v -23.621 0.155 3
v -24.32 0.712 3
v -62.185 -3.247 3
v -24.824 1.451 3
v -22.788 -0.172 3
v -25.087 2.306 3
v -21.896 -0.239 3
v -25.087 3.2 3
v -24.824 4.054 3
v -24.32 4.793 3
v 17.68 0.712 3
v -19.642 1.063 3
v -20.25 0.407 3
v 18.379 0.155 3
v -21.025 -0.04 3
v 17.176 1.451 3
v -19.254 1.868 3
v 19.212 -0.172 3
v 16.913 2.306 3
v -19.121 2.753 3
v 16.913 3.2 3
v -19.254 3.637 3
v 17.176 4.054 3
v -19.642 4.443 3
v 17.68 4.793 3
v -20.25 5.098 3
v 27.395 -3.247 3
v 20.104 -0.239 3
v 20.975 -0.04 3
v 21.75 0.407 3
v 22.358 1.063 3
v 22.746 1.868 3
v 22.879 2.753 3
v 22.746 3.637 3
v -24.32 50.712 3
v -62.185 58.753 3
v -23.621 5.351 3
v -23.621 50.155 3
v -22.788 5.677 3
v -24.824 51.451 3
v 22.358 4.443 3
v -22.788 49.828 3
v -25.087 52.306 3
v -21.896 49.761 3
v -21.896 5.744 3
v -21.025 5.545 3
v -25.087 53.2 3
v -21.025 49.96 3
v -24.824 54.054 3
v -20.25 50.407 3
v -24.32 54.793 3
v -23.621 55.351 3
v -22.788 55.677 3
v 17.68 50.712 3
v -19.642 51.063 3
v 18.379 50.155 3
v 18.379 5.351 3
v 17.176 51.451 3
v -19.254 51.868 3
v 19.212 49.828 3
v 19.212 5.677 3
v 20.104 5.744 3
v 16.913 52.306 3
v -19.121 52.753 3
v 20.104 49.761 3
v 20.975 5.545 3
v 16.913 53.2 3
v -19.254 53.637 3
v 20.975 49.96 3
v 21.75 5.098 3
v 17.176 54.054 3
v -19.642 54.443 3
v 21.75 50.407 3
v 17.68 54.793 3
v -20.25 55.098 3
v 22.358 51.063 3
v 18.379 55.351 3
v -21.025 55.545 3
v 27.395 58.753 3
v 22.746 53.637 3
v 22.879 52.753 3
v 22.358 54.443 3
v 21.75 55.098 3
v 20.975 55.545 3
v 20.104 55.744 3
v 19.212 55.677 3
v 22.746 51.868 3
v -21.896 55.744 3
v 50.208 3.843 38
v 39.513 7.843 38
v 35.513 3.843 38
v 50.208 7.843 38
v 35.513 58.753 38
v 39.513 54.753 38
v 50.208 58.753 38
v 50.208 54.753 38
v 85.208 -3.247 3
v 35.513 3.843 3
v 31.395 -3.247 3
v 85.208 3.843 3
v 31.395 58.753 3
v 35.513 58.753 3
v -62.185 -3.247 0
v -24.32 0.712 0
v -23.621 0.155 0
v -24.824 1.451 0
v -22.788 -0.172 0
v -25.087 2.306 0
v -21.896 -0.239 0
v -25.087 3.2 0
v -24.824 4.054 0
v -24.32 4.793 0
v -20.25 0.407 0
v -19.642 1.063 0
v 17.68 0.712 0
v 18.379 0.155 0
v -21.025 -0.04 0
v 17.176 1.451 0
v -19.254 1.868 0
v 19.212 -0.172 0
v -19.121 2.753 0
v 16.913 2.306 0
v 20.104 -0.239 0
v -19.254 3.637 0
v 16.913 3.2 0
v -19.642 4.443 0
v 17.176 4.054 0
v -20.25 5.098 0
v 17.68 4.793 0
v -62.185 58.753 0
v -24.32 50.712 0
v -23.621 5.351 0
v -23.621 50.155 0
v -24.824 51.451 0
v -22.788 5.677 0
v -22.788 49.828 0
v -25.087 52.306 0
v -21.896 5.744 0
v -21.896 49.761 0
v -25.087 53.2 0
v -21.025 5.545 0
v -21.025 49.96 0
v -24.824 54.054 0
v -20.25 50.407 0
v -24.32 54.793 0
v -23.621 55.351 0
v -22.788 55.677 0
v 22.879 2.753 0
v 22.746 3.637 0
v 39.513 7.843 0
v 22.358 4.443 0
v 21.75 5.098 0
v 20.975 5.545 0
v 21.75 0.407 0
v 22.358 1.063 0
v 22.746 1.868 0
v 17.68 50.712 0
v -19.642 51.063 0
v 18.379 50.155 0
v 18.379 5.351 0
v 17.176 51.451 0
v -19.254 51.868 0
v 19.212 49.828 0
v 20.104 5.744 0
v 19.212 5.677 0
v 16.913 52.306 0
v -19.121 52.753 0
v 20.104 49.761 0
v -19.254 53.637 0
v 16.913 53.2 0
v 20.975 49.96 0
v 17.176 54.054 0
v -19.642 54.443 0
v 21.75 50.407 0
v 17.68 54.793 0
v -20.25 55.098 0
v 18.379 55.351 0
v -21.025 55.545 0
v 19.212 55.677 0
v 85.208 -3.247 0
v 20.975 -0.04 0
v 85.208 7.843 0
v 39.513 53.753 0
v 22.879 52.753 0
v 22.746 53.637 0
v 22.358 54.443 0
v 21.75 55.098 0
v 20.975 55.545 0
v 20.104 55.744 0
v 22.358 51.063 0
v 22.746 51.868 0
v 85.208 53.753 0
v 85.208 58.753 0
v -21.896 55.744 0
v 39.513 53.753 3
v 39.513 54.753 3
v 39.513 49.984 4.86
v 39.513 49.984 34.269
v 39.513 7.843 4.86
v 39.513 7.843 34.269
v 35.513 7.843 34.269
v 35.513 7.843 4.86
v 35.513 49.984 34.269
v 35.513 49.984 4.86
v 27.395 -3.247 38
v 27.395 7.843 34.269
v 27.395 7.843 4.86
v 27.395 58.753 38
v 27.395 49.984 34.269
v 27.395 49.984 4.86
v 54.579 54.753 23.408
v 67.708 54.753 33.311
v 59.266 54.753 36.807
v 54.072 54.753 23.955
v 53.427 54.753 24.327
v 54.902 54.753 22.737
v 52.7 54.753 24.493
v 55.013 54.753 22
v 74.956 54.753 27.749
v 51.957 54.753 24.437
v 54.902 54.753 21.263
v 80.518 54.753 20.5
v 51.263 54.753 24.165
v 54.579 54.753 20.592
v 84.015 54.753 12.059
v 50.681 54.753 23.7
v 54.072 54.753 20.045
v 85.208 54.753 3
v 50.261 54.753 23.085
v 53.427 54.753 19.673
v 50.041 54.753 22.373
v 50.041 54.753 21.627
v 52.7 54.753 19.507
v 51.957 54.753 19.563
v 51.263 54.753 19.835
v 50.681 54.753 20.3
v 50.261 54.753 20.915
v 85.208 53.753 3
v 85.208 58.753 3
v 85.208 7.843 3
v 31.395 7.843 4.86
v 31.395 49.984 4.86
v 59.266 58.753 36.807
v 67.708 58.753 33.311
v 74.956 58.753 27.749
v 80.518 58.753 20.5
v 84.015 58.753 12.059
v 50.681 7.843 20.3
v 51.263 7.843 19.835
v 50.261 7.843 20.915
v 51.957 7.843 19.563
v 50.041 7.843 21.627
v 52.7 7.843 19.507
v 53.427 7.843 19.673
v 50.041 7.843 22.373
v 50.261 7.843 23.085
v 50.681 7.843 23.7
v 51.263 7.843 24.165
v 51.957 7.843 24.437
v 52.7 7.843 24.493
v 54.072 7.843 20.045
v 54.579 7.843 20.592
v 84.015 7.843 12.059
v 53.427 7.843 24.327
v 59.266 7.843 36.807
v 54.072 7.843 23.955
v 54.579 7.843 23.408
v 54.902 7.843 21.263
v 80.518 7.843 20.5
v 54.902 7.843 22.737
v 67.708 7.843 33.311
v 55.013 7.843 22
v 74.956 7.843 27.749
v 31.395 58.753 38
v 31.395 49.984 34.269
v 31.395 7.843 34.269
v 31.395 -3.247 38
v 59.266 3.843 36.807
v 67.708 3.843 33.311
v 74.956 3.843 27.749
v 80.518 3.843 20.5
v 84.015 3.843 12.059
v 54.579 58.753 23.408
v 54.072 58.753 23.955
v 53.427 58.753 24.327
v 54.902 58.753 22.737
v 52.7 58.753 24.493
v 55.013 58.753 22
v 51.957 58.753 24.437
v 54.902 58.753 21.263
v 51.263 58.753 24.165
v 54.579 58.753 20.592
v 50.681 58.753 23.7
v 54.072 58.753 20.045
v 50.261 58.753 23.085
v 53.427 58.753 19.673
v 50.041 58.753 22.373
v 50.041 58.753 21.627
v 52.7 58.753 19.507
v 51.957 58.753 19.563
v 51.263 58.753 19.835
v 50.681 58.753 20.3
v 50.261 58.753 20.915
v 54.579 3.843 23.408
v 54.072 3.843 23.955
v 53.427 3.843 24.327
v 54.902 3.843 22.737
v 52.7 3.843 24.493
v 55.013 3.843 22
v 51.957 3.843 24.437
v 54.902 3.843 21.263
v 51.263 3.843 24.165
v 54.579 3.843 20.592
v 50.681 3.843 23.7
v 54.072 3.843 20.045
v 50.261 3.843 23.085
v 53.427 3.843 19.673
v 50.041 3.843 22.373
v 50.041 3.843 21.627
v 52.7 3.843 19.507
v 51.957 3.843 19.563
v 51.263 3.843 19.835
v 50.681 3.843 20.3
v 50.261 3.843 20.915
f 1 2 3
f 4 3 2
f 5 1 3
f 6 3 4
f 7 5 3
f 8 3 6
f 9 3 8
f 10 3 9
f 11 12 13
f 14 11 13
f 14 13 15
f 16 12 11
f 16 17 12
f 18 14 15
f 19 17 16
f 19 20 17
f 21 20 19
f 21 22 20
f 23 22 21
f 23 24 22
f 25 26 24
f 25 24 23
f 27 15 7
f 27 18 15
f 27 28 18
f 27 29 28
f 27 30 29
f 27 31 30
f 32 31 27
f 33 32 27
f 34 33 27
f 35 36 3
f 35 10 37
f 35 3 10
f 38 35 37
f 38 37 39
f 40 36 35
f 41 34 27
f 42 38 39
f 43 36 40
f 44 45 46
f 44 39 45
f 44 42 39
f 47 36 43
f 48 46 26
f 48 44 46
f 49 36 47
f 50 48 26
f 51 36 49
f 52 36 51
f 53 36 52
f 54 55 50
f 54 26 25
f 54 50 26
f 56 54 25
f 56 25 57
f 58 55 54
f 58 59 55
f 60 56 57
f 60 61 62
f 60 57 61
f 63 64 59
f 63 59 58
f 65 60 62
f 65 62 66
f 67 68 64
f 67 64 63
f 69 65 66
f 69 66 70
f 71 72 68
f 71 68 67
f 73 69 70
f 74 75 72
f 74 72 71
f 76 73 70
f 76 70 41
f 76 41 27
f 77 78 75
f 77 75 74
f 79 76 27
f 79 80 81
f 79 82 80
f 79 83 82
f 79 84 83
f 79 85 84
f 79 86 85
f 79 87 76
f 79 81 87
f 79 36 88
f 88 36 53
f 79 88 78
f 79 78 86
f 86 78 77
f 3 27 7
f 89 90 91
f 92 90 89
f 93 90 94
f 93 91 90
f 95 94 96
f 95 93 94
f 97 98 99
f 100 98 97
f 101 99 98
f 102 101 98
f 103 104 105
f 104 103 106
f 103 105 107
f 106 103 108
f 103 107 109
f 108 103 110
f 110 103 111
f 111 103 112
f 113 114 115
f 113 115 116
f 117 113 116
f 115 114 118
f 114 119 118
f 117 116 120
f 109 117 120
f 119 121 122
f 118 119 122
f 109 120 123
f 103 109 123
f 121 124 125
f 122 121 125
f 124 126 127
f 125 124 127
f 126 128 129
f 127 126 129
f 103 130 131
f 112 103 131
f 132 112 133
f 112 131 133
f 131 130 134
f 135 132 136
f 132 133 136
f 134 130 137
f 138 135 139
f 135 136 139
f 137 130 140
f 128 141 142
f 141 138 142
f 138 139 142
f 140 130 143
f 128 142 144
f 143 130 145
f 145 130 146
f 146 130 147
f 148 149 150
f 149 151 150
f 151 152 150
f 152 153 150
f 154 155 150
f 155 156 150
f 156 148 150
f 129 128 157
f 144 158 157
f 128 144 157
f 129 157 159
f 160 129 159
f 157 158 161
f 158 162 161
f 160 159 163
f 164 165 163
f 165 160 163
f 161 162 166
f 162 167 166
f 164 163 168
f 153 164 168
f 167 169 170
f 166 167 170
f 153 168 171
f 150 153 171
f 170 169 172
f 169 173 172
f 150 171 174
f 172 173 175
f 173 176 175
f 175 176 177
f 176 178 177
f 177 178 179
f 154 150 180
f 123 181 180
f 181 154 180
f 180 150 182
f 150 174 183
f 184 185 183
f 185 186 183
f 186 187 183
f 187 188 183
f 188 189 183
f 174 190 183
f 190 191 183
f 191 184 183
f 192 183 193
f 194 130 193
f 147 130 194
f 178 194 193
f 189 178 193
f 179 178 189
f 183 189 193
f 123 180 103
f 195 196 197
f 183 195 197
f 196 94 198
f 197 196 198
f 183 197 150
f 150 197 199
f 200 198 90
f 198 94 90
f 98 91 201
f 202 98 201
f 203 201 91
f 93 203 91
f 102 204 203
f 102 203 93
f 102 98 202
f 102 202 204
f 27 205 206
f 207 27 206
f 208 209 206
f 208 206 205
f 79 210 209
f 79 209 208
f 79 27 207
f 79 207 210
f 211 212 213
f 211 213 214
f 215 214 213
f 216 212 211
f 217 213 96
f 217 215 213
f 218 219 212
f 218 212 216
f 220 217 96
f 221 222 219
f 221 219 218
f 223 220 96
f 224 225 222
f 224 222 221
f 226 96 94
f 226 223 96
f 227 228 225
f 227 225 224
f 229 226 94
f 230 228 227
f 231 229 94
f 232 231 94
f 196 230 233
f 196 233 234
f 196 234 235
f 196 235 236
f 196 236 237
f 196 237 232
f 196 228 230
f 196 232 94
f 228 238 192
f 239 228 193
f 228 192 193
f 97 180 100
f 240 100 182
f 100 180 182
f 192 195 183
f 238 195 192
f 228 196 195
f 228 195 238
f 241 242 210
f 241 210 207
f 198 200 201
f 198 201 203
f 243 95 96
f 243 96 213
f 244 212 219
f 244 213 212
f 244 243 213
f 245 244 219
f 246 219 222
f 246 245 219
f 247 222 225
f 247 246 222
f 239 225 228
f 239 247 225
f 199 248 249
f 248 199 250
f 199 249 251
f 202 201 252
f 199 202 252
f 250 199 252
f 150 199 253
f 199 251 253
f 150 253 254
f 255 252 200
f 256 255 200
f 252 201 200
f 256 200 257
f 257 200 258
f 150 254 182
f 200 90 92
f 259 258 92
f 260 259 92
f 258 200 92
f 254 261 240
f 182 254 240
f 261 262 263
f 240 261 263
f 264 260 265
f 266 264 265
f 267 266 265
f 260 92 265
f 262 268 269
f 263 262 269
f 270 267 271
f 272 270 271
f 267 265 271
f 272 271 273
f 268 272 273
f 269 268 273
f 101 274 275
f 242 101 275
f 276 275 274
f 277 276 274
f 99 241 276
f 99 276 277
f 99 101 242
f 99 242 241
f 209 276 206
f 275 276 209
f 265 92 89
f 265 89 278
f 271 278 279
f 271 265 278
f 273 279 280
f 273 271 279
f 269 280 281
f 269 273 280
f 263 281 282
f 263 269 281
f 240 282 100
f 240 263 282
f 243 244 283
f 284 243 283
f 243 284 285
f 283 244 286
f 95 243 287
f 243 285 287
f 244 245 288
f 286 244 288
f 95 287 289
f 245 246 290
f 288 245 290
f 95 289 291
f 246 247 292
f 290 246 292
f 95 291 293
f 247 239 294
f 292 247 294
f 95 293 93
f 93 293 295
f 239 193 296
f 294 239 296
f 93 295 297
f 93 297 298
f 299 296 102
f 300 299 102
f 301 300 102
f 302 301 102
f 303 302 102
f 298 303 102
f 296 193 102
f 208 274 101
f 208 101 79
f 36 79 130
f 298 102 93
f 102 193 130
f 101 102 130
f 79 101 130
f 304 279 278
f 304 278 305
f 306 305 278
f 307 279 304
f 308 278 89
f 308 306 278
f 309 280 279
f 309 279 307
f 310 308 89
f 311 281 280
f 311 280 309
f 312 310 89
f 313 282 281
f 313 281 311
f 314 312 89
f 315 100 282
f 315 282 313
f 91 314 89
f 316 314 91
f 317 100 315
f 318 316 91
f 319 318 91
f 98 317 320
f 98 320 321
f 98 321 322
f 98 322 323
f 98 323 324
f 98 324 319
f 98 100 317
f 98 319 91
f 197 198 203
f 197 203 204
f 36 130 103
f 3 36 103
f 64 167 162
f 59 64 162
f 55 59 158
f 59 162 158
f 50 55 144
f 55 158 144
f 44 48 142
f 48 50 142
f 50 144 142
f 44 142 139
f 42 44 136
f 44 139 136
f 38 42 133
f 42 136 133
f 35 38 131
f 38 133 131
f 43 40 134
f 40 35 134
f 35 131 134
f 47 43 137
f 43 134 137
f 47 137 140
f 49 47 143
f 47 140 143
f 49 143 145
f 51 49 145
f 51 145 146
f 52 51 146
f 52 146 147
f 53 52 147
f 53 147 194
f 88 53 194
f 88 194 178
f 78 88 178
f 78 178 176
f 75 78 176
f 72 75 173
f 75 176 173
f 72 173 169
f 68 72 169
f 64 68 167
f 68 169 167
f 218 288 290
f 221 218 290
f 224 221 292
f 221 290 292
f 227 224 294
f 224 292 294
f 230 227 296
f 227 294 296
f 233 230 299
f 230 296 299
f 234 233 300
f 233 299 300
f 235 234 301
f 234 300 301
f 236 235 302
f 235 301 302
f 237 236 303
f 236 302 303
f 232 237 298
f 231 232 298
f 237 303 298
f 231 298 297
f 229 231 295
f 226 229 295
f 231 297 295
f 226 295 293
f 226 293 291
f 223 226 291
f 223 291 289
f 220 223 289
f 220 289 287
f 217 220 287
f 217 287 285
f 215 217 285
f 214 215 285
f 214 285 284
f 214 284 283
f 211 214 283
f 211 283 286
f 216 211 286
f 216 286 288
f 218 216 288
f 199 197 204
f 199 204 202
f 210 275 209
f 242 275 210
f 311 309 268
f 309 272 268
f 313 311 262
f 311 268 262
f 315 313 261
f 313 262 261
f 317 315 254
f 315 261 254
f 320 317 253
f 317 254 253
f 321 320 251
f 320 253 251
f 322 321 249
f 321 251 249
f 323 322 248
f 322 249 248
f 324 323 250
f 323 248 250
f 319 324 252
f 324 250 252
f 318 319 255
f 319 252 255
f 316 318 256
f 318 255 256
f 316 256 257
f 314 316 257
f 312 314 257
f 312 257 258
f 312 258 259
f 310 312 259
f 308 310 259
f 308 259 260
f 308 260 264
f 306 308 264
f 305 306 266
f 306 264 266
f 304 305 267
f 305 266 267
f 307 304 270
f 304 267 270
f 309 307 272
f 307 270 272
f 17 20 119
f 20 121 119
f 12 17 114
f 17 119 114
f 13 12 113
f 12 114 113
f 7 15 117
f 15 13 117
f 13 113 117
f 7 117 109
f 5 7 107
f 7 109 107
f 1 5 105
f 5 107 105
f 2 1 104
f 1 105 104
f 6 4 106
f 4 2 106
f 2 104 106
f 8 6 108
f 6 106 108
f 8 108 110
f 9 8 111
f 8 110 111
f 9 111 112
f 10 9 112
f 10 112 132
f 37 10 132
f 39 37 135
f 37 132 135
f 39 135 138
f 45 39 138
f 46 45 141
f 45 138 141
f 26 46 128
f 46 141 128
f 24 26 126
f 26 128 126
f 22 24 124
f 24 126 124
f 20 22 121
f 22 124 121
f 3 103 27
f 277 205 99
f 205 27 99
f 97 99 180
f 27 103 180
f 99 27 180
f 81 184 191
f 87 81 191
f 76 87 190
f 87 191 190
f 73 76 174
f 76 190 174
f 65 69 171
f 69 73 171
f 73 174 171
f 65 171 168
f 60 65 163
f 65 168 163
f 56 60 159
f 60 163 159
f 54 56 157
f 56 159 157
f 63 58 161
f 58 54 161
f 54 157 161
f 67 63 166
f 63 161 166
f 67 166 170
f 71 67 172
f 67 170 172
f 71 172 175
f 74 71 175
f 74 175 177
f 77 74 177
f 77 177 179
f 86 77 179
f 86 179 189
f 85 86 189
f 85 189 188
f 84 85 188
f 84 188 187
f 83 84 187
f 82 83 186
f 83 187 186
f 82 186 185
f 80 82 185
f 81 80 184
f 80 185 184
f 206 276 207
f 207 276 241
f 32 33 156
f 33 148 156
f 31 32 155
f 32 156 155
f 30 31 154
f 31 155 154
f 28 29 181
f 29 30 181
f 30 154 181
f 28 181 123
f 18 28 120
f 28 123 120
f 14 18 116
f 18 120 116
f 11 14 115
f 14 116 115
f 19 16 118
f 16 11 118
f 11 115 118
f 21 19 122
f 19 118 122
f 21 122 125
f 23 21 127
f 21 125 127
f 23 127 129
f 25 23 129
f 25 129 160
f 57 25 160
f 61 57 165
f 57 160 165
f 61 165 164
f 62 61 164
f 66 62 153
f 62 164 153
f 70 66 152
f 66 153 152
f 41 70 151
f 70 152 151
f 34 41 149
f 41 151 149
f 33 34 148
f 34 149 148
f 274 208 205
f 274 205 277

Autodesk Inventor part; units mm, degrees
ref_plane "YZ Plane" through (0, 0, 0) normal (1, 0, 0) x (0, 1, 0)
ref_plane "XZ Plane" through (0, 0, 0) normal (0, 1, 0) x (-1, 0, 0)
ref_plane "XY Plane" through (0, 0, 0) normal (0, 0, 1) x (1, 0, 0)
sketch "Skizze1" plane through (0, 0, 0) normal (0, 0, 1) x (1, 0, 0)
  arc A0 (-10.0563, 3.3011) -> (-12.2178, -3.2473) centre (-1.2178, -3.2473) ccw projected
  line L0 (-12.2178, -3.2473) -> (9.7822, -3.2473) projected
  arc A1 (9.7822, -3.2473) -> (7.6207, 3.3011) centre (-1.2178, -3.2473) ccw projected
  arc A2 (-3.7041, 1.8719) -> (7.6207, 3.3011) centre (-1.2178, 27.7527) ccw projected
  line L1 (-3.7041, 1.8719) -> (-4.2446, 1.7527) projected
  line L2 (-4.2446, 1.7527) -> (-4.7816, 1.7527) projected
  line L3 (-4.7816, 1.7527) -> (-6.4898, 2.2928) projected
  arc A3 (-10.0563, 3.3011) -> (-6.4898, 2.2928) centre (-1.2178, 27.7527) ccw projected
  arc A4 (-12.2178, 58.7527) -> (-10.0563, 52.2043) centre (-1.2178, 58.7527) ccw projected
  arc A5 (7.6207, 52.2043) -> (-10.0563, 52.2043) centre (-1.2178, 27.7527) ccw projected
  arc A6 (7.6207, 52.2043) -> (9.7822, 58.7527) centre (-1.2178, 58.7527) ccw projected
  line L4 (9.7822, 58.7527) -> (-12.2178, 58.7527) projected
  line L5 (85.2075, 58.7527) -> (80.2075, 58.7527) projected
  line L6 (80.2075, 58.7527) -> (80.2075, 53.7527) projected
  line L7 (80.2075, 53.7527) -> (85.2075, 53.7527) projected
  line L8 (85.2075, 53.7527) -> (85.2075, 58.7527) projected
  line L9 (85.2075, -3.2473) -> (85.2075, 1.7527) projected
  line L10 (85.2075, 1.7527) -> (80.2075, 1.7527) projected
  line L11 (80.2075, 1.7527) -> (80.2075, -3.2473) projected
  line L12 (80.2075, -3.2473) -> (85.2075, -3.2473) projected
  circle A7 centre (19.8794, 52.7527) radius 3 projected
  circle A8 centre (19.8794, 2.7527) radius 3 projected
  circle A9 centre (-22.1206, 2.7527) radius 3 projected
  circle A10 centre (-22.1206, 52.7527) radius 3 projected
  line L13 (85.2075, 58.7527) -> (-62.1847, 58.7527)
  line L14 (-62.1847, 58.7527) -> (-62.1847, -3.2473)
  line L15 (-62.1847, -3.2473) -> (85.2075, -3.2473)
  line L16 (85.2075, -3.2473) -> (85.2075, 58.7527)
  point P0 (0, 0)
extrude "Extrusion1" add sketch "Skizze1" along normal blind 3
sketch "Skizze2" plane through (0, 0, 3) normal (0, 0, 1) x (1, 0, 0)
  circle A0 centre (-3.1206, 27.7527) radius 15 projected
  line L0 (85.2075, 58.7527) -> (-62.1847, 58.7527) projected
  line L1 (-62.1847, -3.2473) -> (85.2075, -3.2473) projected
  line L2 (27.3951, 58.7527) -> (31.3951, 58.7527)
  line L3 (31.3951, 58.7527) -> (31.3951, -3.2473)
  line L4 (31.3951, -3.2473) -> (27.3951, -3.2473)
  line L5 (27.3951, -3.2473) -> (27.3951, 58.7527)
  line L6 (35.5129, 58.7527) -> (39.5129, 58.7527)
  line L7 (39.5129, 58.7527) -> (39.5129, 3.8427)
  line L8 (39.5129, 3.8427) -> (35.5129, 3.8427)
  line L9 (35.5129, 3.8427) -> (35.5129, 58.7527)
  line L10 (85.2075, -3.2473) -> (85.2075, 58.7527) projected
  line L11 (39.5129, 3.8427) -> (85.2075, 3.8427)
  line L12 (85.2075, 3.8427) -> (85.2075, 7.8427)
  line L13 (85.2075, 7.8427) -> (39.5129, 7.8427)
  line L14 (39.5129, 7.8427) -> (39.5129, 3.8427)
  line L15 (39.5129, 58.7527) -> (85.2075, 58.7527)
  line L16 (85.2075, 58.7527) -> (85.2075, 54.7527)
  line L17 (85.2075, 54.7527) -> (39.5129, 54.7527)
  line L18 (39.5129, 54.7527) -> (39.5129, 58.7527)
  point P0 (0, 0)
  dimension "d2" = 4
  dimension "d3" = 4
  dimension "d4" = 45.6946
  dimension "d5" = 4
  dimension "d12" = 45.6946
  dimension "d13" = 4
extrude "Extrusion2" add sketch "Skizze2" along normal blind 35 contours L10 L17 L7 L0 | L7 L8 L9 L0 | L10 L11 L7 L13 | L3 L1 L5 L0
sketch "Skizze3" plane through (0, 0, 3) normal (0, 0, 1) x (1, 0, 0)
  line L0 (39.5129, 54.7527) -> (39.5129, 7.8427) projected
  line L1 (39.5129, 7.8427) -> (85.2075, 7.8427) projected
  line L2 (85.2075, 7.8427) -> (85.2075, 54.7527) projected
  line L3 (35.5129, 58.7527) -> (31.3951, 58.7527) projected
  line L4 (27.7822, 53.7527) -> (85.2075, 53.7527) projected
  line L5 (39.5129, 7.8427) -> (85.2075, 7.8427)
  line L6 (85.2075, 7.8427) -> (85.2075, 53.7527)
  line L7 (85.2075, 53.7527) -> (39.5129, 53.7527)
  line L8 (39.5129, 53.7527) -> (39.5129, 7.8427)
  line L9 (35.5129, 3.8427) -> (35.5129, 58.7527) projected
  line L10 (31.3951, 58.7527) -> (31.3951, -3.2473) projected
  line L11 (31.3951, -3.2473) -> (85.2075, -3.2473) projected
  line L12 (85.2075, -3.2473) -> (85.2075, 3.8427) projected
  line L13 (85.2075, 3.8427) -> (35.5129, 3.8427) projected
  line L14 (85.2075, 54.7527) -> (39.5129, 54.7527) projected
  line L15 (27.3951, -3.2473) -> (27.3951, 58.7527) projected
  line L16 (27.3951, 58.7527) -> (-62.1847, 58.7527) projected
  line L17 (-62.1847, 58.7527) -> (-62.1847, -3.2473) projected
  line L18 (-62.1847, -3.2473) -> (27.3951, -3.2473) projected
  point P0 (0, 0)
extrude "Extrusion3" cut sketch "Skizze3" against normal blind 35 contours L4 L2 L1 L0
sketch "Skizze4" plane through (39.5129, 7.8427, 38) normal (1, 0, 0) x (0, 0, -1)
  line L0 (0, 0) -> (38, 0) projected
  line L1 (38, 45.91) -> (38, 0) projected
  line L2 (35, 45.91) -> (38, 45.91) projected
  line L3 (35, 46.91) -> (35, 45.91) projected
  line L4 (0, 0) -> (0, 46.91) projected
  line L5 (0, 0) -> (38, 0) projected
  line L6 (33.1404, 0) -> (3.7306, 0)
  line L7 (3.7306, 0) -> (3.7306, 42.1415)
  line L8 (3.7306, 42.1415) -> (33.1404, 42.1415)
  line L9 (33.1404, 42.1415) -> (33.1404, 0)
  line L10 (35, 46.91) -> (0, 46.91) projected
  point P0 (38, -7.8427)
extrude "Extrusion4" cut sketch "Skizze4" against normal blind 35 contours L7 L8 L9 L0
fillet "Rundung1" radius 35 2 edges at (85.2075, 5.8427, 38) (85.2075, 56.7527, 38)
sketch "Skizze5" plane through (-62.1847, 58.7527, 0) normal (0, 1, 0) x (1, 0, 0)
  arc A0 (112.3922, -38) -> (147.3922, -3) centre (112.3922, -3) ccw projected
  line L0 (147.3922, 0) -> (147.3922, -3) projected
  line L1 (147.3922, 0) -> (0, 0) projected
  line L2 (0, 0) -> (0, -3) projected
  line L3 (89.5798, -3) -> (0, -3) projected
  line L4 (89.5798, -3) -> (89.5798, -38) projected
  line L5 (93.5798, -38) -> (89.5798, -38) projected
  line L6 (93.5798, -3) -> (93.5798, -38) projected
  line L7 (97.6976, -3) -> (93.5798, -3) projected
  line L8 (97.6976, -3) -> (97.6976, -38) projected
  line L9 (112.3922, -38) -> (97.6976, -38) projected
  circle A1 centre (114.698, -22) radius 2.5
  point P0 (62.1847, 0)
  dimension "d15" = 5
extrude "Extrusion5" cut sketch "Skizze5" against normal through all contours A1
properties part number "13_Zwischenebene_LCD"
